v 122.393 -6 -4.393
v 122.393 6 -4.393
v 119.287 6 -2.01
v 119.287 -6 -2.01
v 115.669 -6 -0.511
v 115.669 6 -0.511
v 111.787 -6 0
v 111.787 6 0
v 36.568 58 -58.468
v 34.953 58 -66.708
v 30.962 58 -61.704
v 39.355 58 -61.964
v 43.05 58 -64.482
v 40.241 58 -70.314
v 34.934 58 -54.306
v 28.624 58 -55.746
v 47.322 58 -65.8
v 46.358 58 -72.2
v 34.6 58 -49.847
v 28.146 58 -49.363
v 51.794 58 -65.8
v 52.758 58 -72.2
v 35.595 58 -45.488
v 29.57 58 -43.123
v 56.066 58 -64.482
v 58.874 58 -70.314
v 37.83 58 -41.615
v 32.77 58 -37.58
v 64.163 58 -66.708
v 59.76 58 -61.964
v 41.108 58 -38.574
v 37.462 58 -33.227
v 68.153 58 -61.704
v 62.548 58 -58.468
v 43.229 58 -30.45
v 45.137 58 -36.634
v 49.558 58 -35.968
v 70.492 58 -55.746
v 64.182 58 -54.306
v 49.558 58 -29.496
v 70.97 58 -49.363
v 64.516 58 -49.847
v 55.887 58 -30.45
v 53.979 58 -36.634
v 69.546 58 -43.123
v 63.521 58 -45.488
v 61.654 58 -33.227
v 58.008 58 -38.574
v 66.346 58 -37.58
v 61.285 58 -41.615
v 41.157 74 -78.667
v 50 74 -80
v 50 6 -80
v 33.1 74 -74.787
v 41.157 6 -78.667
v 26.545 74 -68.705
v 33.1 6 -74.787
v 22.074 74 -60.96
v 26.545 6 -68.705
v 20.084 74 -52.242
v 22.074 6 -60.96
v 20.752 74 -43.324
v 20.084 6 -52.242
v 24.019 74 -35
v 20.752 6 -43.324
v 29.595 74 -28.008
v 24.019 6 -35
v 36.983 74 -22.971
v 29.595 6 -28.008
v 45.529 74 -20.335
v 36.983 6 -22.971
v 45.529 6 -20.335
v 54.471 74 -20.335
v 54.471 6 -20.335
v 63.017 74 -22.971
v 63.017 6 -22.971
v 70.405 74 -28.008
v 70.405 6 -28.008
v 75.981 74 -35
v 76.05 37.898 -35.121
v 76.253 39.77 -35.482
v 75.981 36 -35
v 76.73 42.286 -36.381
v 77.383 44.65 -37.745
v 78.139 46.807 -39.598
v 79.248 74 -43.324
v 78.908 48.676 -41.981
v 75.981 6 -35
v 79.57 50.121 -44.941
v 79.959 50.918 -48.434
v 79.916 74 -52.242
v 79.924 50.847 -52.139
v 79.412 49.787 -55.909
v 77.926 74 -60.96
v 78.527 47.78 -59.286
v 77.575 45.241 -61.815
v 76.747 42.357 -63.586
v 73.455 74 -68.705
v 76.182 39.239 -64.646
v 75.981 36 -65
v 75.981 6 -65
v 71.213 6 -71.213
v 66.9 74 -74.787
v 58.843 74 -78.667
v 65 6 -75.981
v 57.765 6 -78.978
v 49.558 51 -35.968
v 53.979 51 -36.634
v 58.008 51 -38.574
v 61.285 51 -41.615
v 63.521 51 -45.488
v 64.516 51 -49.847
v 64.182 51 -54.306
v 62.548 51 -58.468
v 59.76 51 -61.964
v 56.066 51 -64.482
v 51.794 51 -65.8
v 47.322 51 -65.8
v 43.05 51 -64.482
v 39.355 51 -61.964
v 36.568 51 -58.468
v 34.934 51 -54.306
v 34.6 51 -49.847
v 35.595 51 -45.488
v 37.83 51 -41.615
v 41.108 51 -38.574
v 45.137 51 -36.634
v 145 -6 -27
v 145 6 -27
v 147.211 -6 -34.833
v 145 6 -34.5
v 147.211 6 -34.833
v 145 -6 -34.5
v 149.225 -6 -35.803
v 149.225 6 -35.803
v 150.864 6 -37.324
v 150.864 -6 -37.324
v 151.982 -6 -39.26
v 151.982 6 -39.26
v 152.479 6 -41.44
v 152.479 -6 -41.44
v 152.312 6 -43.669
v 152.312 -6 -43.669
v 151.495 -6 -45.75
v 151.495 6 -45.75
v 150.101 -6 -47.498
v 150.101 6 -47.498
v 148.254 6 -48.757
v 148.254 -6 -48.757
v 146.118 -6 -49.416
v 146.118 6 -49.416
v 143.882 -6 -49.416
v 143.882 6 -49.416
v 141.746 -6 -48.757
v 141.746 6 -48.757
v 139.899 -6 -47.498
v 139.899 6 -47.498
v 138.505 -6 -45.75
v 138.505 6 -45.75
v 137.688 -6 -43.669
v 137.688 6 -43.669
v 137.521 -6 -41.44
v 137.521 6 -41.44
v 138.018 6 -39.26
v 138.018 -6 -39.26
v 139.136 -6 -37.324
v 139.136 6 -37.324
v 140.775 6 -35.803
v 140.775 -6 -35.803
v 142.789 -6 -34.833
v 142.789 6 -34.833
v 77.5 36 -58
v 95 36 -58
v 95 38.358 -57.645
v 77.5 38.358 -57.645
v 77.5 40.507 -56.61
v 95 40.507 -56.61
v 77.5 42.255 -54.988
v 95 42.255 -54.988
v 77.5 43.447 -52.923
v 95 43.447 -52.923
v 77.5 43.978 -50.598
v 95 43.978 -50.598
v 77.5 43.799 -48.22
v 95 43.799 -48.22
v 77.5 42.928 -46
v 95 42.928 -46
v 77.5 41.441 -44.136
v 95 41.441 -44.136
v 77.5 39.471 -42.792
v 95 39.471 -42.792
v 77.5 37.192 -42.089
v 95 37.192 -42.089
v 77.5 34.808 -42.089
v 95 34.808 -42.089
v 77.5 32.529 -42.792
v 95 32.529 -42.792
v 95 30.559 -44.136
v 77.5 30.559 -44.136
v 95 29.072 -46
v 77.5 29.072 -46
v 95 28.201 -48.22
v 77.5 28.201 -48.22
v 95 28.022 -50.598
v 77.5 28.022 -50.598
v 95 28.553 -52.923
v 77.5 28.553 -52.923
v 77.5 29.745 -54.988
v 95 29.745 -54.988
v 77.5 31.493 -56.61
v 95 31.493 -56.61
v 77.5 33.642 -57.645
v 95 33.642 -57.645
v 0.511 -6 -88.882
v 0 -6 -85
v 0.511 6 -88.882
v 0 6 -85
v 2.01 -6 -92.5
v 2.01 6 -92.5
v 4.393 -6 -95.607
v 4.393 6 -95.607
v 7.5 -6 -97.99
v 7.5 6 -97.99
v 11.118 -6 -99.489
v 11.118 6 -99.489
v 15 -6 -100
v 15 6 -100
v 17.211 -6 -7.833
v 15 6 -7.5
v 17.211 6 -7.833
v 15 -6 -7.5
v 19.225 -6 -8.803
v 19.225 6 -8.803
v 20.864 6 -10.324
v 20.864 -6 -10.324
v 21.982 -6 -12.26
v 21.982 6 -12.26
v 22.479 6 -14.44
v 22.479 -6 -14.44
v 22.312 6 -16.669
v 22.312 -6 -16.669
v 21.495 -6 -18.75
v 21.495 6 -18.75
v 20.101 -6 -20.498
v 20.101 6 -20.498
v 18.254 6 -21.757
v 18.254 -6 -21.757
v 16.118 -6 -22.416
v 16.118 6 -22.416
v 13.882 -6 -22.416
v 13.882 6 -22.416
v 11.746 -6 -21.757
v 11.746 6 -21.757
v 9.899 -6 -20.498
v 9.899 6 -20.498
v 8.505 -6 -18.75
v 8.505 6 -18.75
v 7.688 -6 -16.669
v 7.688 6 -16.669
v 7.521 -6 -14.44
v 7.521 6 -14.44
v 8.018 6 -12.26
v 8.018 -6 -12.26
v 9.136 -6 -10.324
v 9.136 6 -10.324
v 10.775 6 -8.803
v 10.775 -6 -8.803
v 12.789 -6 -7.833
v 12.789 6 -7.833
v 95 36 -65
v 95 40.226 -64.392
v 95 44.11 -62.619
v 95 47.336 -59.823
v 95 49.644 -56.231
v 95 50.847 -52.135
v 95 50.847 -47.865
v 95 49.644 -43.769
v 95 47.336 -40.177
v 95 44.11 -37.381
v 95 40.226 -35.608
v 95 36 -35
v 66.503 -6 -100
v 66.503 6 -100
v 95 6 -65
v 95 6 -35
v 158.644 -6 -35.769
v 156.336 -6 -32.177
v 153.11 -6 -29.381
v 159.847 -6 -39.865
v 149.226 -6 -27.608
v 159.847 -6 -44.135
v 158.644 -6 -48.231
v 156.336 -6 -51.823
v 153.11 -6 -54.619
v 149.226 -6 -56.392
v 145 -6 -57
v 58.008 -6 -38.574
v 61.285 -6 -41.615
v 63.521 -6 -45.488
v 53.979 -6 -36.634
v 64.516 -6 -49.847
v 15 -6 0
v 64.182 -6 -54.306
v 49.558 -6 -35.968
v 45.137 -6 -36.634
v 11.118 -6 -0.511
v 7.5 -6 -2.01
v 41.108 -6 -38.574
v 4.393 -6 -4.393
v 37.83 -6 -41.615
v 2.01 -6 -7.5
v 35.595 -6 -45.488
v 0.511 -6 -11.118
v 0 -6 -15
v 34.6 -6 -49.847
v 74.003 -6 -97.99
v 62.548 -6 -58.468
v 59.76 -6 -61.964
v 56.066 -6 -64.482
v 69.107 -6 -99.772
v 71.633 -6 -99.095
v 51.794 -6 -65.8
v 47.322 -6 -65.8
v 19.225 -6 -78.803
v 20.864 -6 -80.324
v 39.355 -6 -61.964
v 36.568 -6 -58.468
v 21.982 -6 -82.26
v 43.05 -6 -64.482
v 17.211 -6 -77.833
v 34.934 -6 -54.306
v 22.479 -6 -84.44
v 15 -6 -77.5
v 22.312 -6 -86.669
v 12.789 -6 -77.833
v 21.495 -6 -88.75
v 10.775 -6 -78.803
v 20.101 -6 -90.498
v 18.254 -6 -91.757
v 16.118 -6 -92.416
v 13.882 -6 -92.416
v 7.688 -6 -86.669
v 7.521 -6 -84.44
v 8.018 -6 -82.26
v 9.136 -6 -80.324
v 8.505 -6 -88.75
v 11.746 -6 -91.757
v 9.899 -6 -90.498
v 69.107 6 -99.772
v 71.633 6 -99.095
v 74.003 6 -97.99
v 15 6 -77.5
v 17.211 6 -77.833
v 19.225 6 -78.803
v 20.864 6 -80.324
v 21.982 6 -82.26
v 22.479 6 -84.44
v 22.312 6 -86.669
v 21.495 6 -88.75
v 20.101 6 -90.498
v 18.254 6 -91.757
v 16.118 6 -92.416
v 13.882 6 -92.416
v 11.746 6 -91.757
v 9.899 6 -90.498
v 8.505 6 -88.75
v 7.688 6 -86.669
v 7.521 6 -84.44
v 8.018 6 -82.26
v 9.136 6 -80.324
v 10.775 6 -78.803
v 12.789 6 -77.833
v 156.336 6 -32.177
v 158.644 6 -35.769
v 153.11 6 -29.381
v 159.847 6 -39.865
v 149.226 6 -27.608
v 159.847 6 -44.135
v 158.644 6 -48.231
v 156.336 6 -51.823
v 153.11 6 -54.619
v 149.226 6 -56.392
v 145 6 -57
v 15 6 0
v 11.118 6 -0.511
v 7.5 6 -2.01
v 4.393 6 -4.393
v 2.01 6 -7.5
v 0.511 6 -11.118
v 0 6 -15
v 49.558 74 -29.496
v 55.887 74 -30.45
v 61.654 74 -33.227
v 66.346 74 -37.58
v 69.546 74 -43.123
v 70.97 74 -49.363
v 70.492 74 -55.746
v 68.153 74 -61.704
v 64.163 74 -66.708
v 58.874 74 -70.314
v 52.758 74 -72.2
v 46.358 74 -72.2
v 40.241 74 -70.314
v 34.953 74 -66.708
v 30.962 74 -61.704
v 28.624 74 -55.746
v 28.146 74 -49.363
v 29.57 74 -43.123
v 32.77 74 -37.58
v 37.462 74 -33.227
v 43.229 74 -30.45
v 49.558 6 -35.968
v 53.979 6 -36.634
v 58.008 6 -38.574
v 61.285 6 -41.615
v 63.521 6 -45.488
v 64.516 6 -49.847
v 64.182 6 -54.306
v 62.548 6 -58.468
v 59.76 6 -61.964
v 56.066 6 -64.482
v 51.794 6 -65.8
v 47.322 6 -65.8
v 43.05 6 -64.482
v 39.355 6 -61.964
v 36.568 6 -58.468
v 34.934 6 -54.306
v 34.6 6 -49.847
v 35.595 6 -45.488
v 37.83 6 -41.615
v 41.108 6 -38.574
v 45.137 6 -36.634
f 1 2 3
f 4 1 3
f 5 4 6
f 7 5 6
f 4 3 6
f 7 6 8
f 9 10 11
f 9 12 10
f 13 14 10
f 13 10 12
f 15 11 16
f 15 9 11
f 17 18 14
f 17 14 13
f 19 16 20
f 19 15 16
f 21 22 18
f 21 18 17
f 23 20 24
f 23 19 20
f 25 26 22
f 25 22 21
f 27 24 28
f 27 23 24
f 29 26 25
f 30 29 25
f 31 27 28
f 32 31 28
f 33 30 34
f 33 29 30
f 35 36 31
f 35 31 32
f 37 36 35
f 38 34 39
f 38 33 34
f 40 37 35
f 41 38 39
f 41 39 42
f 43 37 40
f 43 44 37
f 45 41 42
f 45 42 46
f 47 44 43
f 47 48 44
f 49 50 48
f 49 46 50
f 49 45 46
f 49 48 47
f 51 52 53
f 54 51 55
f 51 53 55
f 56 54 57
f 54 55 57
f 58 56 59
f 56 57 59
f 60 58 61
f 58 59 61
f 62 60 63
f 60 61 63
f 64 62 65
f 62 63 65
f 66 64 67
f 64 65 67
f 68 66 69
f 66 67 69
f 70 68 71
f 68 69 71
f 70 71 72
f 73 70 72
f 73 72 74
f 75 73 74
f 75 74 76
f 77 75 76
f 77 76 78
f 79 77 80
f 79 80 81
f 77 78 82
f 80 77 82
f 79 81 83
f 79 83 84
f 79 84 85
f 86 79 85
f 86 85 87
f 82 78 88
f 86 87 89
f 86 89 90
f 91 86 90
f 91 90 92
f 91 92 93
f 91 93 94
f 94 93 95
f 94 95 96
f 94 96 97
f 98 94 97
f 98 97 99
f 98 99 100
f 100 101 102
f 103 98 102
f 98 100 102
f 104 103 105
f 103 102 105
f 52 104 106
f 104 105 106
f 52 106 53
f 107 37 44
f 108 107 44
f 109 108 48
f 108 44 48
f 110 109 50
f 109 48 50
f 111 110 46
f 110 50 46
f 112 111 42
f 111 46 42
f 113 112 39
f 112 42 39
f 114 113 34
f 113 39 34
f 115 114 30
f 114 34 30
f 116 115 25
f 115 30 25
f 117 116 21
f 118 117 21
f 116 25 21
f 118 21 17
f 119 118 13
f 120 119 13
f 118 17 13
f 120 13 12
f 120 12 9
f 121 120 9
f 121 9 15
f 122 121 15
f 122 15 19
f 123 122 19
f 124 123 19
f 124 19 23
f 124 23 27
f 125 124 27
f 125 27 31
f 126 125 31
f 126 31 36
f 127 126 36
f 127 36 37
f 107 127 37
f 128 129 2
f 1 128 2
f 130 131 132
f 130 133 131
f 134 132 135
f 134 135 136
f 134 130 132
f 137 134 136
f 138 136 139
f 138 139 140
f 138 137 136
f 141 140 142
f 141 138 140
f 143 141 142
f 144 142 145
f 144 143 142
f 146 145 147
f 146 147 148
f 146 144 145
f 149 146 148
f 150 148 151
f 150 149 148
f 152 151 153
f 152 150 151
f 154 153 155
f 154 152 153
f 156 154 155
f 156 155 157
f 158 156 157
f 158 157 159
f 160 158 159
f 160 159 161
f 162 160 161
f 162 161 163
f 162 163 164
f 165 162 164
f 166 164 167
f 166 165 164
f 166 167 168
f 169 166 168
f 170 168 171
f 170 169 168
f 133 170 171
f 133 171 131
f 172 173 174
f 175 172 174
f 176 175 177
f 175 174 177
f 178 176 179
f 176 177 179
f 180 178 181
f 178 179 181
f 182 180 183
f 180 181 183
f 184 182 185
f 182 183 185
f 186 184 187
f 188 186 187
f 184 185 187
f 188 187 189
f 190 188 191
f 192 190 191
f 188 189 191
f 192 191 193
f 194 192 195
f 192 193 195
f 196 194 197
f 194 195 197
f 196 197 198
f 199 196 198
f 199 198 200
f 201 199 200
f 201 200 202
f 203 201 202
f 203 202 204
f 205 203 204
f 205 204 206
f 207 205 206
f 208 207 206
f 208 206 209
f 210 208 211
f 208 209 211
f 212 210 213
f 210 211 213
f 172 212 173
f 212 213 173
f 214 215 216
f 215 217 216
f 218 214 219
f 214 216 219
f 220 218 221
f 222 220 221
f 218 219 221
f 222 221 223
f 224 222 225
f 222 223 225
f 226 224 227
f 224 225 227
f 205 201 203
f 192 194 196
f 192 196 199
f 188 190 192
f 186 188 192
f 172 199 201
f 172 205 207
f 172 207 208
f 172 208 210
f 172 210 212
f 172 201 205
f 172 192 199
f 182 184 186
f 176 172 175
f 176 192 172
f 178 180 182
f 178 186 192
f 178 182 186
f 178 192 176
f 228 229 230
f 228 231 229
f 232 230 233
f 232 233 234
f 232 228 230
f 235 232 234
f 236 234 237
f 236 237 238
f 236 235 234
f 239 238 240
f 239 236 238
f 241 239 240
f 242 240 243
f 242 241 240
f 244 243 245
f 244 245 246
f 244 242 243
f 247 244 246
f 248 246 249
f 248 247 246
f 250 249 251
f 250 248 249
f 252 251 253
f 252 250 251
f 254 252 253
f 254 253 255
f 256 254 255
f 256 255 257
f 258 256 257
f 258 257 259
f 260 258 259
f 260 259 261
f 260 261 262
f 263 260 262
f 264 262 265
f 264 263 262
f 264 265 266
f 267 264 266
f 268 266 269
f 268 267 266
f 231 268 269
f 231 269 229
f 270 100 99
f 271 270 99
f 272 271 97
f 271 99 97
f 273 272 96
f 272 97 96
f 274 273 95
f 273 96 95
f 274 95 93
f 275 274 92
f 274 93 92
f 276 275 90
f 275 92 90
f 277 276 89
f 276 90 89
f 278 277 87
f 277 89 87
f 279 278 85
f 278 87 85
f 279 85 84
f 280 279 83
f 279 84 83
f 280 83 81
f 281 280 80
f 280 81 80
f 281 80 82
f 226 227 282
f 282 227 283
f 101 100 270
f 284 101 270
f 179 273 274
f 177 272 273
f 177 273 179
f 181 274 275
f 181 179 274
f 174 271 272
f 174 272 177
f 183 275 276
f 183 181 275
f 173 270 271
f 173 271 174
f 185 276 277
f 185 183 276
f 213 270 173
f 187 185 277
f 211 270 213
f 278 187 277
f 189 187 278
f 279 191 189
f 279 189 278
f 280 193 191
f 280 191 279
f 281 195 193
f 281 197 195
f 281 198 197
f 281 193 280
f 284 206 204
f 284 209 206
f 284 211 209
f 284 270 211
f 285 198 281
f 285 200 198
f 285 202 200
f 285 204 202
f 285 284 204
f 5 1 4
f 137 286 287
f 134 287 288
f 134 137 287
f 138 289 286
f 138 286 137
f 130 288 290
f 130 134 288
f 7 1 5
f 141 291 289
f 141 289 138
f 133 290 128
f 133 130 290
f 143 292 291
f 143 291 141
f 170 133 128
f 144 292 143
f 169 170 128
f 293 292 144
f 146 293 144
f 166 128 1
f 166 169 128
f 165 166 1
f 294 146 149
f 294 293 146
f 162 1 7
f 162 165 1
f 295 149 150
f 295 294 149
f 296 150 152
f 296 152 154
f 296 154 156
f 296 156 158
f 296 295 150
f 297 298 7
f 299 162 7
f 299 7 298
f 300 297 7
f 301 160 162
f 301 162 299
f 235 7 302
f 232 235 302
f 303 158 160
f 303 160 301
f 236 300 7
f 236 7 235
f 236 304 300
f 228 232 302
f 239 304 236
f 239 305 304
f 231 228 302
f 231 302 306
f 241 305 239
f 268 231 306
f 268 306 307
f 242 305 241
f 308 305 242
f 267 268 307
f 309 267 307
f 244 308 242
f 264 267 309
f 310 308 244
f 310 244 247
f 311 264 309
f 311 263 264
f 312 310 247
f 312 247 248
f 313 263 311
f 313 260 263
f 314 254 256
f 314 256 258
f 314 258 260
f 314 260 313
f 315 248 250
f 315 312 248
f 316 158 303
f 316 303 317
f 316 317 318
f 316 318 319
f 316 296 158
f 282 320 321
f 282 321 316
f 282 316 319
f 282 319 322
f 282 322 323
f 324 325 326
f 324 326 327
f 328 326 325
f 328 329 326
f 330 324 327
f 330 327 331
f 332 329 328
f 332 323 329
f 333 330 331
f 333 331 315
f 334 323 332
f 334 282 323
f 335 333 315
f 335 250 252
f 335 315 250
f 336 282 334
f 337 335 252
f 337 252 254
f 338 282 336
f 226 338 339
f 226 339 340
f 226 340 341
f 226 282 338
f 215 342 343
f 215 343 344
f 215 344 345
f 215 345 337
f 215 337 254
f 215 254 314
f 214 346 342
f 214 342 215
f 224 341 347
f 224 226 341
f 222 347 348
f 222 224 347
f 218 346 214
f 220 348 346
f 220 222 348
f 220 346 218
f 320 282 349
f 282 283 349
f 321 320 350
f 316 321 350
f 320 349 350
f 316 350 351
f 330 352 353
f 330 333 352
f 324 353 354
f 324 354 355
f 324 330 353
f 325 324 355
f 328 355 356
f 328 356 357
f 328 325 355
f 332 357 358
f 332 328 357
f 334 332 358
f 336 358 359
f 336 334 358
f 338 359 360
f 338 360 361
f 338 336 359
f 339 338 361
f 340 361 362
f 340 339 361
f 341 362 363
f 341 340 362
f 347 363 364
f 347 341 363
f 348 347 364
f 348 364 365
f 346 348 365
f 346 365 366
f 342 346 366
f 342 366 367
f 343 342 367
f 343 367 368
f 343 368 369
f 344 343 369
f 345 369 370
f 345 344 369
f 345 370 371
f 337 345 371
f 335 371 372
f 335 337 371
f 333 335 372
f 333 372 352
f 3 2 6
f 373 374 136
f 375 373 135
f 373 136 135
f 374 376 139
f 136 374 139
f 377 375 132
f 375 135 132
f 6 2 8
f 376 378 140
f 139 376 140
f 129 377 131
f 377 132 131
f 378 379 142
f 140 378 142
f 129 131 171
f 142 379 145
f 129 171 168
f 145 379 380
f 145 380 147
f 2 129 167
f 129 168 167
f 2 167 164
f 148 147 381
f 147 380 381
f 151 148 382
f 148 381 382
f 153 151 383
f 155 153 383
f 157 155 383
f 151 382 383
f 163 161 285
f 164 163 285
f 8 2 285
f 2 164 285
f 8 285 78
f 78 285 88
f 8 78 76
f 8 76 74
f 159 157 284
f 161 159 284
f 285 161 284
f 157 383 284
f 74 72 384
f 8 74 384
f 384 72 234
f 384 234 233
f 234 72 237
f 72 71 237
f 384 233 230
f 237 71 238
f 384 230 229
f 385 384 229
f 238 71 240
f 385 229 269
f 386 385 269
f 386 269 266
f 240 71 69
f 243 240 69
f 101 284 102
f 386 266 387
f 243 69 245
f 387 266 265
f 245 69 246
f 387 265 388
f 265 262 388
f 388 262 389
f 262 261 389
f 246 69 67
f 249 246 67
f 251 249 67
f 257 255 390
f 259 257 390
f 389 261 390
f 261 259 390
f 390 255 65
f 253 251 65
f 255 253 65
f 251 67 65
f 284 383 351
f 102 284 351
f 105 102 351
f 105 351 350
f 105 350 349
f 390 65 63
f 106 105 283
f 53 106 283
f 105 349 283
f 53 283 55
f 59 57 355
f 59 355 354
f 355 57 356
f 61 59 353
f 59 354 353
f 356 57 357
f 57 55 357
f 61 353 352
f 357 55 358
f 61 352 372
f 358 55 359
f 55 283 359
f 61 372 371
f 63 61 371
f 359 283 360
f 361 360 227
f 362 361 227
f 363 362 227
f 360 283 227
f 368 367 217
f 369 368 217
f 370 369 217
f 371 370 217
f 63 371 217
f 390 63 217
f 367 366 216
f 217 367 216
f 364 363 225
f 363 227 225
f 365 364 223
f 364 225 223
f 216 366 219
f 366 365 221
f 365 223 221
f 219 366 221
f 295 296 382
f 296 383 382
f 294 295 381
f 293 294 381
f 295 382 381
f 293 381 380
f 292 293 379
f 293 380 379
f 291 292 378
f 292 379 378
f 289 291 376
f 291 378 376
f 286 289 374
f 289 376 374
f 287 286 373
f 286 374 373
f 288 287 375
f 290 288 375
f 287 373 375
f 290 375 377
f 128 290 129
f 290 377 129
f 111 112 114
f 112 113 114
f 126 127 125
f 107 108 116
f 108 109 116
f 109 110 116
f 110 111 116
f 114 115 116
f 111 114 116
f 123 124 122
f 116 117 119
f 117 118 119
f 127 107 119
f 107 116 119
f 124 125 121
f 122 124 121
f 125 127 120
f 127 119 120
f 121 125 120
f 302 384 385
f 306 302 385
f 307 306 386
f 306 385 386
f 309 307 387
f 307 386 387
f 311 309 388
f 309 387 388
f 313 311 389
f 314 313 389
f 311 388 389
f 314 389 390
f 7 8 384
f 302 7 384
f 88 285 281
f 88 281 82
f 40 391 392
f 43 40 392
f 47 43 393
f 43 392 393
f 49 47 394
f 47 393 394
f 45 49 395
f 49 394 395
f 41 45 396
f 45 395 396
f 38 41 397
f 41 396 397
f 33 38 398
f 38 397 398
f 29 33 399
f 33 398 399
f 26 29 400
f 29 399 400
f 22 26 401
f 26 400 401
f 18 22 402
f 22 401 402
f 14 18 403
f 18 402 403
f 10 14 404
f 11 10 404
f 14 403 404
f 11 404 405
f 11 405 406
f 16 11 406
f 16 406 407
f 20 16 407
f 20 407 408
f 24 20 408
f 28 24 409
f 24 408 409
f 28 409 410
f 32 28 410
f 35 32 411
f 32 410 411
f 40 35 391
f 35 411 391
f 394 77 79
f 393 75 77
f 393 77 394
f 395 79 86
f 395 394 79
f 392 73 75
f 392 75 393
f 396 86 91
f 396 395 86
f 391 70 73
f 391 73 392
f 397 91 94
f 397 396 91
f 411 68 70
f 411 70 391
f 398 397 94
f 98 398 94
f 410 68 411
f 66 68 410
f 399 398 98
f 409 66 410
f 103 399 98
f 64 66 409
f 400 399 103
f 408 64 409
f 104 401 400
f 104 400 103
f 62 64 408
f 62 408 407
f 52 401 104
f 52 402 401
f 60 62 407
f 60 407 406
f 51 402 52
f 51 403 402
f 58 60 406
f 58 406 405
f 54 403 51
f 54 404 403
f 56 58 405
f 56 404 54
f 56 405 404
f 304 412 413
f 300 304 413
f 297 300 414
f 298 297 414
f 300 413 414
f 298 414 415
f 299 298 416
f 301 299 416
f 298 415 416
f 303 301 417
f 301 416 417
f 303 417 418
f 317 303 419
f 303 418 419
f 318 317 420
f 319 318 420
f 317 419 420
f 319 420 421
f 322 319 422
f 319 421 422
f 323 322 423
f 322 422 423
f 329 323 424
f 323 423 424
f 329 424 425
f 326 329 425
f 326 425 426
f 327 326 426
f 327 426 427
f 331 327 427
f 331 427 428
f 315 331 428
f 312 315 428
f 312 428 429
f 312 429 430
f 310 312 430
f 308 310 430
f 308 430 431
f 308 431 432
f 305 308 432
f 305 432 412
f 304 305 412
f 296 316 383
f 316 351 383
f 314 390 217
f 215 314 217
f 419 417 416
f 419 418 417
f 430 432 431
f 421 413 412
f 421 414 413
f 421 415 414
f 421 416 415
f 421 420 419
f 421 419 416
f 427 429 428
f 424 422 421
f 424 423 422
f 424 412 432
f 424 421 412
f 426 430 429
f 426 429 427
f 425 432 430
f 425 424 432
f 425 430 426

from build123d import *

# Parameters (mm, degrees)
SKETCH2_R           = 7.5
BOSS_EXTRUDE3_DEPTH = 6
SKETCH4_R           = 30
BOSS_EXTRUDE6_DEPTH = 68
SKETCH5_R           = 15
CUT_EXTRUDE1_DEPTH  = 205.939015319
SKETCH6_R           = 21.472161424
CUT_EXTRUDE3_DEPTH  = 16
BOSS_EXTRUDE7_DEPTH = 45
FILLET2_R           = 15
SKETCH9_R           = 8
CUT_EXTRUDE8_DEPTH  = 17.5


with BuildPart() as part:
    # Sketch2 → Boss-Extrude3 (new, symmetric)
    with BuildSketch(Plane(origin=(0, 0, 0), x_dir=(1, 0, 0), z_dir=(0, 1, 0))):
        with BuildLine():
            Line((0, 15), (0, 85))
            ThreePointArc((0, 85), (4.393398282, 95.606601718), (15, 100))
            Line((15, 100), (66.502577388, 100))
            ThreePointArc((66.502577388, 100), (70.384863065, 99.488887394), (74.002577388, 97.990381057))
            Line((74.002577388, 97.990381057), (145, 57))
            ThreePointArc((145, 57), (160, 42), (145, 27))
            Line((145, 27), (122.393398282, 4.393398282))
            ThreePointArc((122.393398282, 4.393398282), (117.52704805, 1.141807012), (111.786796564, 0))
            Line((111.786796564, 0), (15, 0))
            ThreePointArc((15, 0), (4.393398282, 4.393398282), (0, 15))
        make_face()
        with Locations(Location((145, 42, 0), (0, 0, 270))):
            Circle(SKETCH2_R, mode=Mode.SUBTRACT)
        with Locations(Location((15, 85, 0), (0, 0, 270))):
            Circle(SKETCH2_R, mode=Mode.SUBTRACT)
        with Locations(Location((15, 15, 0), (0, 0, 270))):
            Circle(SKETCH2_R, mode=Mode.SUBTRACT)
    extrude(amount=BOSS_EXTRUDE3_DEPTH, both=True)

    # Sketch4 → Boss-Extrude6 (add)
    with BuildSketch(Plane(origin=(0, 6, 0), x_dir=(1, 0, 0), z_dir=(0, 1, 0))):
        with Locations(Location((50, 50, 0), (0, 0, 90))):
            Circle(SKETCH4_R)
    extrude(amount=BOSS_EXTRUDE6_DEPTH)

    # Sketch5 → Cut-Extrude1 (cut, through all)
    with BuildSketch(Plane(origin=(0, 74, 0), x_dir=(1, 0, 0), z_dir=(0, 1, 0))):
        with Locations(Location((49.557906347, 50.967812226, 0), (0, 0, 270))):
            Circle(SKETCH5_R)
    extrude(amount=-CUT_EXTRUDE1_DEPTH, mode=Mode.SUBTRACT)

    # Sketch6 → Cut-Extrude3 (cut)
    with BuildSketch(Plane(origin=(0, 74, 0), x_dir=(1, 0, 0), z_dir=(0, 1, 0))):
        with Locations(Location((49.557906347, 50.967812226, 0), (0, 0, 270))):
            Circle(SKETCH6_R)
    extrude(amount=-CUT_EXTRUDE3_DEPTH, mode=Mode.SUBTRACT)

    # Sketch8 → Boss-Extrude7 (add)
    with BuildSketch(Plane(origin=(0, 6, 0), x_dir=(1, 0, 0), z_dir=(0, 1, 0))):
        with BuildLine():
            Line((75.980762114, 65), (95, 65))
            Line((95, 65), (95, 50))
            Line((95, 50), (95, 35))
            Line((95, 35), (75.980762114, 35))
            ThreePointArc((75.980762114, 35), (20, 50), (75.980762114, 65))
        make_face()
    extrude(amount=BOSS_EXTRUDE7_DEPTH)

    # Fillet2
    # the kernel refuses this fillet: 15 mm, written as the material it takes off along each edge
    with BuildSketch(Plane(origin=(38.480762114, 51, -65), x_dir=(0, 0, 1), z_dir=(1, 0, 0))) as fillet2_piece_1_section:
        with BuildLine():
            CenterArc((FILLET2_R, FILLET2_R), FILLET2_R, 180, 90)
            Line((0, FILLET2_R), (0, 0))
            Line((0, 0), (FILLET2_R, 0))
        make_face()
    fillet2_piece_1 = extrude(amount=94.019237886, mode=Mode.PRIVATE)
    fillet2_piece_1 = fillet2_piece_1 - Plane(origin=(50, 47.545700525, -50), x_dir=(0, 0, -1), z_dir=(0, -1, 0)) * Cylinder(30, 249, mode=Mode.PRIVATE)
    add(fillet2_piece_1, mode=Mode.SUBTRACT)
    with BuildSketch(Plane(origin=(132.5, 51, -35), x_dir=(0, -1, 0), z_dir=(-1, 0, 0))) as fillet2_piece_2_section:
        with BuildLine():
            CenterArc((FILLET2_R, -FILLET2_R), FILLET2_R, 90, 90)
            Line((0, -FILLET2_R), (0, 0))
            Line((0, 0), (FILLET2_R, 0))
        make_face()
    fillet2_piece_2 = extrude(amount=94.019237886, mode=Mode.PRIVATE)
    fillet2_piece_2 = fillet2_piece_2 - Plane(origin=(50, 47.545704386, -50), x_dir=(0, 0, -1), z_dir=(0, -1, 0)) * Cylinder(30, 249, mode=Mode.PRIVATE)
    add(fillet2_piece_2, mode=Mode.SUBTRACT)

    # Sketch9 → Cut-Extrude8 (cut, symmetric)
    with BuildSketch(Plane(origin=(95, 0, 0), x_dir=(0, 0, -1), z_dir=(1, 0, 0))):
        with Locations((50, 36)):
            Circle(SKETCH9_R)
    extrude(amount=CUT_EXTRUDE8_DEPTH, both=True, mode=Mode.SUBTRACT)


solid = part.part
